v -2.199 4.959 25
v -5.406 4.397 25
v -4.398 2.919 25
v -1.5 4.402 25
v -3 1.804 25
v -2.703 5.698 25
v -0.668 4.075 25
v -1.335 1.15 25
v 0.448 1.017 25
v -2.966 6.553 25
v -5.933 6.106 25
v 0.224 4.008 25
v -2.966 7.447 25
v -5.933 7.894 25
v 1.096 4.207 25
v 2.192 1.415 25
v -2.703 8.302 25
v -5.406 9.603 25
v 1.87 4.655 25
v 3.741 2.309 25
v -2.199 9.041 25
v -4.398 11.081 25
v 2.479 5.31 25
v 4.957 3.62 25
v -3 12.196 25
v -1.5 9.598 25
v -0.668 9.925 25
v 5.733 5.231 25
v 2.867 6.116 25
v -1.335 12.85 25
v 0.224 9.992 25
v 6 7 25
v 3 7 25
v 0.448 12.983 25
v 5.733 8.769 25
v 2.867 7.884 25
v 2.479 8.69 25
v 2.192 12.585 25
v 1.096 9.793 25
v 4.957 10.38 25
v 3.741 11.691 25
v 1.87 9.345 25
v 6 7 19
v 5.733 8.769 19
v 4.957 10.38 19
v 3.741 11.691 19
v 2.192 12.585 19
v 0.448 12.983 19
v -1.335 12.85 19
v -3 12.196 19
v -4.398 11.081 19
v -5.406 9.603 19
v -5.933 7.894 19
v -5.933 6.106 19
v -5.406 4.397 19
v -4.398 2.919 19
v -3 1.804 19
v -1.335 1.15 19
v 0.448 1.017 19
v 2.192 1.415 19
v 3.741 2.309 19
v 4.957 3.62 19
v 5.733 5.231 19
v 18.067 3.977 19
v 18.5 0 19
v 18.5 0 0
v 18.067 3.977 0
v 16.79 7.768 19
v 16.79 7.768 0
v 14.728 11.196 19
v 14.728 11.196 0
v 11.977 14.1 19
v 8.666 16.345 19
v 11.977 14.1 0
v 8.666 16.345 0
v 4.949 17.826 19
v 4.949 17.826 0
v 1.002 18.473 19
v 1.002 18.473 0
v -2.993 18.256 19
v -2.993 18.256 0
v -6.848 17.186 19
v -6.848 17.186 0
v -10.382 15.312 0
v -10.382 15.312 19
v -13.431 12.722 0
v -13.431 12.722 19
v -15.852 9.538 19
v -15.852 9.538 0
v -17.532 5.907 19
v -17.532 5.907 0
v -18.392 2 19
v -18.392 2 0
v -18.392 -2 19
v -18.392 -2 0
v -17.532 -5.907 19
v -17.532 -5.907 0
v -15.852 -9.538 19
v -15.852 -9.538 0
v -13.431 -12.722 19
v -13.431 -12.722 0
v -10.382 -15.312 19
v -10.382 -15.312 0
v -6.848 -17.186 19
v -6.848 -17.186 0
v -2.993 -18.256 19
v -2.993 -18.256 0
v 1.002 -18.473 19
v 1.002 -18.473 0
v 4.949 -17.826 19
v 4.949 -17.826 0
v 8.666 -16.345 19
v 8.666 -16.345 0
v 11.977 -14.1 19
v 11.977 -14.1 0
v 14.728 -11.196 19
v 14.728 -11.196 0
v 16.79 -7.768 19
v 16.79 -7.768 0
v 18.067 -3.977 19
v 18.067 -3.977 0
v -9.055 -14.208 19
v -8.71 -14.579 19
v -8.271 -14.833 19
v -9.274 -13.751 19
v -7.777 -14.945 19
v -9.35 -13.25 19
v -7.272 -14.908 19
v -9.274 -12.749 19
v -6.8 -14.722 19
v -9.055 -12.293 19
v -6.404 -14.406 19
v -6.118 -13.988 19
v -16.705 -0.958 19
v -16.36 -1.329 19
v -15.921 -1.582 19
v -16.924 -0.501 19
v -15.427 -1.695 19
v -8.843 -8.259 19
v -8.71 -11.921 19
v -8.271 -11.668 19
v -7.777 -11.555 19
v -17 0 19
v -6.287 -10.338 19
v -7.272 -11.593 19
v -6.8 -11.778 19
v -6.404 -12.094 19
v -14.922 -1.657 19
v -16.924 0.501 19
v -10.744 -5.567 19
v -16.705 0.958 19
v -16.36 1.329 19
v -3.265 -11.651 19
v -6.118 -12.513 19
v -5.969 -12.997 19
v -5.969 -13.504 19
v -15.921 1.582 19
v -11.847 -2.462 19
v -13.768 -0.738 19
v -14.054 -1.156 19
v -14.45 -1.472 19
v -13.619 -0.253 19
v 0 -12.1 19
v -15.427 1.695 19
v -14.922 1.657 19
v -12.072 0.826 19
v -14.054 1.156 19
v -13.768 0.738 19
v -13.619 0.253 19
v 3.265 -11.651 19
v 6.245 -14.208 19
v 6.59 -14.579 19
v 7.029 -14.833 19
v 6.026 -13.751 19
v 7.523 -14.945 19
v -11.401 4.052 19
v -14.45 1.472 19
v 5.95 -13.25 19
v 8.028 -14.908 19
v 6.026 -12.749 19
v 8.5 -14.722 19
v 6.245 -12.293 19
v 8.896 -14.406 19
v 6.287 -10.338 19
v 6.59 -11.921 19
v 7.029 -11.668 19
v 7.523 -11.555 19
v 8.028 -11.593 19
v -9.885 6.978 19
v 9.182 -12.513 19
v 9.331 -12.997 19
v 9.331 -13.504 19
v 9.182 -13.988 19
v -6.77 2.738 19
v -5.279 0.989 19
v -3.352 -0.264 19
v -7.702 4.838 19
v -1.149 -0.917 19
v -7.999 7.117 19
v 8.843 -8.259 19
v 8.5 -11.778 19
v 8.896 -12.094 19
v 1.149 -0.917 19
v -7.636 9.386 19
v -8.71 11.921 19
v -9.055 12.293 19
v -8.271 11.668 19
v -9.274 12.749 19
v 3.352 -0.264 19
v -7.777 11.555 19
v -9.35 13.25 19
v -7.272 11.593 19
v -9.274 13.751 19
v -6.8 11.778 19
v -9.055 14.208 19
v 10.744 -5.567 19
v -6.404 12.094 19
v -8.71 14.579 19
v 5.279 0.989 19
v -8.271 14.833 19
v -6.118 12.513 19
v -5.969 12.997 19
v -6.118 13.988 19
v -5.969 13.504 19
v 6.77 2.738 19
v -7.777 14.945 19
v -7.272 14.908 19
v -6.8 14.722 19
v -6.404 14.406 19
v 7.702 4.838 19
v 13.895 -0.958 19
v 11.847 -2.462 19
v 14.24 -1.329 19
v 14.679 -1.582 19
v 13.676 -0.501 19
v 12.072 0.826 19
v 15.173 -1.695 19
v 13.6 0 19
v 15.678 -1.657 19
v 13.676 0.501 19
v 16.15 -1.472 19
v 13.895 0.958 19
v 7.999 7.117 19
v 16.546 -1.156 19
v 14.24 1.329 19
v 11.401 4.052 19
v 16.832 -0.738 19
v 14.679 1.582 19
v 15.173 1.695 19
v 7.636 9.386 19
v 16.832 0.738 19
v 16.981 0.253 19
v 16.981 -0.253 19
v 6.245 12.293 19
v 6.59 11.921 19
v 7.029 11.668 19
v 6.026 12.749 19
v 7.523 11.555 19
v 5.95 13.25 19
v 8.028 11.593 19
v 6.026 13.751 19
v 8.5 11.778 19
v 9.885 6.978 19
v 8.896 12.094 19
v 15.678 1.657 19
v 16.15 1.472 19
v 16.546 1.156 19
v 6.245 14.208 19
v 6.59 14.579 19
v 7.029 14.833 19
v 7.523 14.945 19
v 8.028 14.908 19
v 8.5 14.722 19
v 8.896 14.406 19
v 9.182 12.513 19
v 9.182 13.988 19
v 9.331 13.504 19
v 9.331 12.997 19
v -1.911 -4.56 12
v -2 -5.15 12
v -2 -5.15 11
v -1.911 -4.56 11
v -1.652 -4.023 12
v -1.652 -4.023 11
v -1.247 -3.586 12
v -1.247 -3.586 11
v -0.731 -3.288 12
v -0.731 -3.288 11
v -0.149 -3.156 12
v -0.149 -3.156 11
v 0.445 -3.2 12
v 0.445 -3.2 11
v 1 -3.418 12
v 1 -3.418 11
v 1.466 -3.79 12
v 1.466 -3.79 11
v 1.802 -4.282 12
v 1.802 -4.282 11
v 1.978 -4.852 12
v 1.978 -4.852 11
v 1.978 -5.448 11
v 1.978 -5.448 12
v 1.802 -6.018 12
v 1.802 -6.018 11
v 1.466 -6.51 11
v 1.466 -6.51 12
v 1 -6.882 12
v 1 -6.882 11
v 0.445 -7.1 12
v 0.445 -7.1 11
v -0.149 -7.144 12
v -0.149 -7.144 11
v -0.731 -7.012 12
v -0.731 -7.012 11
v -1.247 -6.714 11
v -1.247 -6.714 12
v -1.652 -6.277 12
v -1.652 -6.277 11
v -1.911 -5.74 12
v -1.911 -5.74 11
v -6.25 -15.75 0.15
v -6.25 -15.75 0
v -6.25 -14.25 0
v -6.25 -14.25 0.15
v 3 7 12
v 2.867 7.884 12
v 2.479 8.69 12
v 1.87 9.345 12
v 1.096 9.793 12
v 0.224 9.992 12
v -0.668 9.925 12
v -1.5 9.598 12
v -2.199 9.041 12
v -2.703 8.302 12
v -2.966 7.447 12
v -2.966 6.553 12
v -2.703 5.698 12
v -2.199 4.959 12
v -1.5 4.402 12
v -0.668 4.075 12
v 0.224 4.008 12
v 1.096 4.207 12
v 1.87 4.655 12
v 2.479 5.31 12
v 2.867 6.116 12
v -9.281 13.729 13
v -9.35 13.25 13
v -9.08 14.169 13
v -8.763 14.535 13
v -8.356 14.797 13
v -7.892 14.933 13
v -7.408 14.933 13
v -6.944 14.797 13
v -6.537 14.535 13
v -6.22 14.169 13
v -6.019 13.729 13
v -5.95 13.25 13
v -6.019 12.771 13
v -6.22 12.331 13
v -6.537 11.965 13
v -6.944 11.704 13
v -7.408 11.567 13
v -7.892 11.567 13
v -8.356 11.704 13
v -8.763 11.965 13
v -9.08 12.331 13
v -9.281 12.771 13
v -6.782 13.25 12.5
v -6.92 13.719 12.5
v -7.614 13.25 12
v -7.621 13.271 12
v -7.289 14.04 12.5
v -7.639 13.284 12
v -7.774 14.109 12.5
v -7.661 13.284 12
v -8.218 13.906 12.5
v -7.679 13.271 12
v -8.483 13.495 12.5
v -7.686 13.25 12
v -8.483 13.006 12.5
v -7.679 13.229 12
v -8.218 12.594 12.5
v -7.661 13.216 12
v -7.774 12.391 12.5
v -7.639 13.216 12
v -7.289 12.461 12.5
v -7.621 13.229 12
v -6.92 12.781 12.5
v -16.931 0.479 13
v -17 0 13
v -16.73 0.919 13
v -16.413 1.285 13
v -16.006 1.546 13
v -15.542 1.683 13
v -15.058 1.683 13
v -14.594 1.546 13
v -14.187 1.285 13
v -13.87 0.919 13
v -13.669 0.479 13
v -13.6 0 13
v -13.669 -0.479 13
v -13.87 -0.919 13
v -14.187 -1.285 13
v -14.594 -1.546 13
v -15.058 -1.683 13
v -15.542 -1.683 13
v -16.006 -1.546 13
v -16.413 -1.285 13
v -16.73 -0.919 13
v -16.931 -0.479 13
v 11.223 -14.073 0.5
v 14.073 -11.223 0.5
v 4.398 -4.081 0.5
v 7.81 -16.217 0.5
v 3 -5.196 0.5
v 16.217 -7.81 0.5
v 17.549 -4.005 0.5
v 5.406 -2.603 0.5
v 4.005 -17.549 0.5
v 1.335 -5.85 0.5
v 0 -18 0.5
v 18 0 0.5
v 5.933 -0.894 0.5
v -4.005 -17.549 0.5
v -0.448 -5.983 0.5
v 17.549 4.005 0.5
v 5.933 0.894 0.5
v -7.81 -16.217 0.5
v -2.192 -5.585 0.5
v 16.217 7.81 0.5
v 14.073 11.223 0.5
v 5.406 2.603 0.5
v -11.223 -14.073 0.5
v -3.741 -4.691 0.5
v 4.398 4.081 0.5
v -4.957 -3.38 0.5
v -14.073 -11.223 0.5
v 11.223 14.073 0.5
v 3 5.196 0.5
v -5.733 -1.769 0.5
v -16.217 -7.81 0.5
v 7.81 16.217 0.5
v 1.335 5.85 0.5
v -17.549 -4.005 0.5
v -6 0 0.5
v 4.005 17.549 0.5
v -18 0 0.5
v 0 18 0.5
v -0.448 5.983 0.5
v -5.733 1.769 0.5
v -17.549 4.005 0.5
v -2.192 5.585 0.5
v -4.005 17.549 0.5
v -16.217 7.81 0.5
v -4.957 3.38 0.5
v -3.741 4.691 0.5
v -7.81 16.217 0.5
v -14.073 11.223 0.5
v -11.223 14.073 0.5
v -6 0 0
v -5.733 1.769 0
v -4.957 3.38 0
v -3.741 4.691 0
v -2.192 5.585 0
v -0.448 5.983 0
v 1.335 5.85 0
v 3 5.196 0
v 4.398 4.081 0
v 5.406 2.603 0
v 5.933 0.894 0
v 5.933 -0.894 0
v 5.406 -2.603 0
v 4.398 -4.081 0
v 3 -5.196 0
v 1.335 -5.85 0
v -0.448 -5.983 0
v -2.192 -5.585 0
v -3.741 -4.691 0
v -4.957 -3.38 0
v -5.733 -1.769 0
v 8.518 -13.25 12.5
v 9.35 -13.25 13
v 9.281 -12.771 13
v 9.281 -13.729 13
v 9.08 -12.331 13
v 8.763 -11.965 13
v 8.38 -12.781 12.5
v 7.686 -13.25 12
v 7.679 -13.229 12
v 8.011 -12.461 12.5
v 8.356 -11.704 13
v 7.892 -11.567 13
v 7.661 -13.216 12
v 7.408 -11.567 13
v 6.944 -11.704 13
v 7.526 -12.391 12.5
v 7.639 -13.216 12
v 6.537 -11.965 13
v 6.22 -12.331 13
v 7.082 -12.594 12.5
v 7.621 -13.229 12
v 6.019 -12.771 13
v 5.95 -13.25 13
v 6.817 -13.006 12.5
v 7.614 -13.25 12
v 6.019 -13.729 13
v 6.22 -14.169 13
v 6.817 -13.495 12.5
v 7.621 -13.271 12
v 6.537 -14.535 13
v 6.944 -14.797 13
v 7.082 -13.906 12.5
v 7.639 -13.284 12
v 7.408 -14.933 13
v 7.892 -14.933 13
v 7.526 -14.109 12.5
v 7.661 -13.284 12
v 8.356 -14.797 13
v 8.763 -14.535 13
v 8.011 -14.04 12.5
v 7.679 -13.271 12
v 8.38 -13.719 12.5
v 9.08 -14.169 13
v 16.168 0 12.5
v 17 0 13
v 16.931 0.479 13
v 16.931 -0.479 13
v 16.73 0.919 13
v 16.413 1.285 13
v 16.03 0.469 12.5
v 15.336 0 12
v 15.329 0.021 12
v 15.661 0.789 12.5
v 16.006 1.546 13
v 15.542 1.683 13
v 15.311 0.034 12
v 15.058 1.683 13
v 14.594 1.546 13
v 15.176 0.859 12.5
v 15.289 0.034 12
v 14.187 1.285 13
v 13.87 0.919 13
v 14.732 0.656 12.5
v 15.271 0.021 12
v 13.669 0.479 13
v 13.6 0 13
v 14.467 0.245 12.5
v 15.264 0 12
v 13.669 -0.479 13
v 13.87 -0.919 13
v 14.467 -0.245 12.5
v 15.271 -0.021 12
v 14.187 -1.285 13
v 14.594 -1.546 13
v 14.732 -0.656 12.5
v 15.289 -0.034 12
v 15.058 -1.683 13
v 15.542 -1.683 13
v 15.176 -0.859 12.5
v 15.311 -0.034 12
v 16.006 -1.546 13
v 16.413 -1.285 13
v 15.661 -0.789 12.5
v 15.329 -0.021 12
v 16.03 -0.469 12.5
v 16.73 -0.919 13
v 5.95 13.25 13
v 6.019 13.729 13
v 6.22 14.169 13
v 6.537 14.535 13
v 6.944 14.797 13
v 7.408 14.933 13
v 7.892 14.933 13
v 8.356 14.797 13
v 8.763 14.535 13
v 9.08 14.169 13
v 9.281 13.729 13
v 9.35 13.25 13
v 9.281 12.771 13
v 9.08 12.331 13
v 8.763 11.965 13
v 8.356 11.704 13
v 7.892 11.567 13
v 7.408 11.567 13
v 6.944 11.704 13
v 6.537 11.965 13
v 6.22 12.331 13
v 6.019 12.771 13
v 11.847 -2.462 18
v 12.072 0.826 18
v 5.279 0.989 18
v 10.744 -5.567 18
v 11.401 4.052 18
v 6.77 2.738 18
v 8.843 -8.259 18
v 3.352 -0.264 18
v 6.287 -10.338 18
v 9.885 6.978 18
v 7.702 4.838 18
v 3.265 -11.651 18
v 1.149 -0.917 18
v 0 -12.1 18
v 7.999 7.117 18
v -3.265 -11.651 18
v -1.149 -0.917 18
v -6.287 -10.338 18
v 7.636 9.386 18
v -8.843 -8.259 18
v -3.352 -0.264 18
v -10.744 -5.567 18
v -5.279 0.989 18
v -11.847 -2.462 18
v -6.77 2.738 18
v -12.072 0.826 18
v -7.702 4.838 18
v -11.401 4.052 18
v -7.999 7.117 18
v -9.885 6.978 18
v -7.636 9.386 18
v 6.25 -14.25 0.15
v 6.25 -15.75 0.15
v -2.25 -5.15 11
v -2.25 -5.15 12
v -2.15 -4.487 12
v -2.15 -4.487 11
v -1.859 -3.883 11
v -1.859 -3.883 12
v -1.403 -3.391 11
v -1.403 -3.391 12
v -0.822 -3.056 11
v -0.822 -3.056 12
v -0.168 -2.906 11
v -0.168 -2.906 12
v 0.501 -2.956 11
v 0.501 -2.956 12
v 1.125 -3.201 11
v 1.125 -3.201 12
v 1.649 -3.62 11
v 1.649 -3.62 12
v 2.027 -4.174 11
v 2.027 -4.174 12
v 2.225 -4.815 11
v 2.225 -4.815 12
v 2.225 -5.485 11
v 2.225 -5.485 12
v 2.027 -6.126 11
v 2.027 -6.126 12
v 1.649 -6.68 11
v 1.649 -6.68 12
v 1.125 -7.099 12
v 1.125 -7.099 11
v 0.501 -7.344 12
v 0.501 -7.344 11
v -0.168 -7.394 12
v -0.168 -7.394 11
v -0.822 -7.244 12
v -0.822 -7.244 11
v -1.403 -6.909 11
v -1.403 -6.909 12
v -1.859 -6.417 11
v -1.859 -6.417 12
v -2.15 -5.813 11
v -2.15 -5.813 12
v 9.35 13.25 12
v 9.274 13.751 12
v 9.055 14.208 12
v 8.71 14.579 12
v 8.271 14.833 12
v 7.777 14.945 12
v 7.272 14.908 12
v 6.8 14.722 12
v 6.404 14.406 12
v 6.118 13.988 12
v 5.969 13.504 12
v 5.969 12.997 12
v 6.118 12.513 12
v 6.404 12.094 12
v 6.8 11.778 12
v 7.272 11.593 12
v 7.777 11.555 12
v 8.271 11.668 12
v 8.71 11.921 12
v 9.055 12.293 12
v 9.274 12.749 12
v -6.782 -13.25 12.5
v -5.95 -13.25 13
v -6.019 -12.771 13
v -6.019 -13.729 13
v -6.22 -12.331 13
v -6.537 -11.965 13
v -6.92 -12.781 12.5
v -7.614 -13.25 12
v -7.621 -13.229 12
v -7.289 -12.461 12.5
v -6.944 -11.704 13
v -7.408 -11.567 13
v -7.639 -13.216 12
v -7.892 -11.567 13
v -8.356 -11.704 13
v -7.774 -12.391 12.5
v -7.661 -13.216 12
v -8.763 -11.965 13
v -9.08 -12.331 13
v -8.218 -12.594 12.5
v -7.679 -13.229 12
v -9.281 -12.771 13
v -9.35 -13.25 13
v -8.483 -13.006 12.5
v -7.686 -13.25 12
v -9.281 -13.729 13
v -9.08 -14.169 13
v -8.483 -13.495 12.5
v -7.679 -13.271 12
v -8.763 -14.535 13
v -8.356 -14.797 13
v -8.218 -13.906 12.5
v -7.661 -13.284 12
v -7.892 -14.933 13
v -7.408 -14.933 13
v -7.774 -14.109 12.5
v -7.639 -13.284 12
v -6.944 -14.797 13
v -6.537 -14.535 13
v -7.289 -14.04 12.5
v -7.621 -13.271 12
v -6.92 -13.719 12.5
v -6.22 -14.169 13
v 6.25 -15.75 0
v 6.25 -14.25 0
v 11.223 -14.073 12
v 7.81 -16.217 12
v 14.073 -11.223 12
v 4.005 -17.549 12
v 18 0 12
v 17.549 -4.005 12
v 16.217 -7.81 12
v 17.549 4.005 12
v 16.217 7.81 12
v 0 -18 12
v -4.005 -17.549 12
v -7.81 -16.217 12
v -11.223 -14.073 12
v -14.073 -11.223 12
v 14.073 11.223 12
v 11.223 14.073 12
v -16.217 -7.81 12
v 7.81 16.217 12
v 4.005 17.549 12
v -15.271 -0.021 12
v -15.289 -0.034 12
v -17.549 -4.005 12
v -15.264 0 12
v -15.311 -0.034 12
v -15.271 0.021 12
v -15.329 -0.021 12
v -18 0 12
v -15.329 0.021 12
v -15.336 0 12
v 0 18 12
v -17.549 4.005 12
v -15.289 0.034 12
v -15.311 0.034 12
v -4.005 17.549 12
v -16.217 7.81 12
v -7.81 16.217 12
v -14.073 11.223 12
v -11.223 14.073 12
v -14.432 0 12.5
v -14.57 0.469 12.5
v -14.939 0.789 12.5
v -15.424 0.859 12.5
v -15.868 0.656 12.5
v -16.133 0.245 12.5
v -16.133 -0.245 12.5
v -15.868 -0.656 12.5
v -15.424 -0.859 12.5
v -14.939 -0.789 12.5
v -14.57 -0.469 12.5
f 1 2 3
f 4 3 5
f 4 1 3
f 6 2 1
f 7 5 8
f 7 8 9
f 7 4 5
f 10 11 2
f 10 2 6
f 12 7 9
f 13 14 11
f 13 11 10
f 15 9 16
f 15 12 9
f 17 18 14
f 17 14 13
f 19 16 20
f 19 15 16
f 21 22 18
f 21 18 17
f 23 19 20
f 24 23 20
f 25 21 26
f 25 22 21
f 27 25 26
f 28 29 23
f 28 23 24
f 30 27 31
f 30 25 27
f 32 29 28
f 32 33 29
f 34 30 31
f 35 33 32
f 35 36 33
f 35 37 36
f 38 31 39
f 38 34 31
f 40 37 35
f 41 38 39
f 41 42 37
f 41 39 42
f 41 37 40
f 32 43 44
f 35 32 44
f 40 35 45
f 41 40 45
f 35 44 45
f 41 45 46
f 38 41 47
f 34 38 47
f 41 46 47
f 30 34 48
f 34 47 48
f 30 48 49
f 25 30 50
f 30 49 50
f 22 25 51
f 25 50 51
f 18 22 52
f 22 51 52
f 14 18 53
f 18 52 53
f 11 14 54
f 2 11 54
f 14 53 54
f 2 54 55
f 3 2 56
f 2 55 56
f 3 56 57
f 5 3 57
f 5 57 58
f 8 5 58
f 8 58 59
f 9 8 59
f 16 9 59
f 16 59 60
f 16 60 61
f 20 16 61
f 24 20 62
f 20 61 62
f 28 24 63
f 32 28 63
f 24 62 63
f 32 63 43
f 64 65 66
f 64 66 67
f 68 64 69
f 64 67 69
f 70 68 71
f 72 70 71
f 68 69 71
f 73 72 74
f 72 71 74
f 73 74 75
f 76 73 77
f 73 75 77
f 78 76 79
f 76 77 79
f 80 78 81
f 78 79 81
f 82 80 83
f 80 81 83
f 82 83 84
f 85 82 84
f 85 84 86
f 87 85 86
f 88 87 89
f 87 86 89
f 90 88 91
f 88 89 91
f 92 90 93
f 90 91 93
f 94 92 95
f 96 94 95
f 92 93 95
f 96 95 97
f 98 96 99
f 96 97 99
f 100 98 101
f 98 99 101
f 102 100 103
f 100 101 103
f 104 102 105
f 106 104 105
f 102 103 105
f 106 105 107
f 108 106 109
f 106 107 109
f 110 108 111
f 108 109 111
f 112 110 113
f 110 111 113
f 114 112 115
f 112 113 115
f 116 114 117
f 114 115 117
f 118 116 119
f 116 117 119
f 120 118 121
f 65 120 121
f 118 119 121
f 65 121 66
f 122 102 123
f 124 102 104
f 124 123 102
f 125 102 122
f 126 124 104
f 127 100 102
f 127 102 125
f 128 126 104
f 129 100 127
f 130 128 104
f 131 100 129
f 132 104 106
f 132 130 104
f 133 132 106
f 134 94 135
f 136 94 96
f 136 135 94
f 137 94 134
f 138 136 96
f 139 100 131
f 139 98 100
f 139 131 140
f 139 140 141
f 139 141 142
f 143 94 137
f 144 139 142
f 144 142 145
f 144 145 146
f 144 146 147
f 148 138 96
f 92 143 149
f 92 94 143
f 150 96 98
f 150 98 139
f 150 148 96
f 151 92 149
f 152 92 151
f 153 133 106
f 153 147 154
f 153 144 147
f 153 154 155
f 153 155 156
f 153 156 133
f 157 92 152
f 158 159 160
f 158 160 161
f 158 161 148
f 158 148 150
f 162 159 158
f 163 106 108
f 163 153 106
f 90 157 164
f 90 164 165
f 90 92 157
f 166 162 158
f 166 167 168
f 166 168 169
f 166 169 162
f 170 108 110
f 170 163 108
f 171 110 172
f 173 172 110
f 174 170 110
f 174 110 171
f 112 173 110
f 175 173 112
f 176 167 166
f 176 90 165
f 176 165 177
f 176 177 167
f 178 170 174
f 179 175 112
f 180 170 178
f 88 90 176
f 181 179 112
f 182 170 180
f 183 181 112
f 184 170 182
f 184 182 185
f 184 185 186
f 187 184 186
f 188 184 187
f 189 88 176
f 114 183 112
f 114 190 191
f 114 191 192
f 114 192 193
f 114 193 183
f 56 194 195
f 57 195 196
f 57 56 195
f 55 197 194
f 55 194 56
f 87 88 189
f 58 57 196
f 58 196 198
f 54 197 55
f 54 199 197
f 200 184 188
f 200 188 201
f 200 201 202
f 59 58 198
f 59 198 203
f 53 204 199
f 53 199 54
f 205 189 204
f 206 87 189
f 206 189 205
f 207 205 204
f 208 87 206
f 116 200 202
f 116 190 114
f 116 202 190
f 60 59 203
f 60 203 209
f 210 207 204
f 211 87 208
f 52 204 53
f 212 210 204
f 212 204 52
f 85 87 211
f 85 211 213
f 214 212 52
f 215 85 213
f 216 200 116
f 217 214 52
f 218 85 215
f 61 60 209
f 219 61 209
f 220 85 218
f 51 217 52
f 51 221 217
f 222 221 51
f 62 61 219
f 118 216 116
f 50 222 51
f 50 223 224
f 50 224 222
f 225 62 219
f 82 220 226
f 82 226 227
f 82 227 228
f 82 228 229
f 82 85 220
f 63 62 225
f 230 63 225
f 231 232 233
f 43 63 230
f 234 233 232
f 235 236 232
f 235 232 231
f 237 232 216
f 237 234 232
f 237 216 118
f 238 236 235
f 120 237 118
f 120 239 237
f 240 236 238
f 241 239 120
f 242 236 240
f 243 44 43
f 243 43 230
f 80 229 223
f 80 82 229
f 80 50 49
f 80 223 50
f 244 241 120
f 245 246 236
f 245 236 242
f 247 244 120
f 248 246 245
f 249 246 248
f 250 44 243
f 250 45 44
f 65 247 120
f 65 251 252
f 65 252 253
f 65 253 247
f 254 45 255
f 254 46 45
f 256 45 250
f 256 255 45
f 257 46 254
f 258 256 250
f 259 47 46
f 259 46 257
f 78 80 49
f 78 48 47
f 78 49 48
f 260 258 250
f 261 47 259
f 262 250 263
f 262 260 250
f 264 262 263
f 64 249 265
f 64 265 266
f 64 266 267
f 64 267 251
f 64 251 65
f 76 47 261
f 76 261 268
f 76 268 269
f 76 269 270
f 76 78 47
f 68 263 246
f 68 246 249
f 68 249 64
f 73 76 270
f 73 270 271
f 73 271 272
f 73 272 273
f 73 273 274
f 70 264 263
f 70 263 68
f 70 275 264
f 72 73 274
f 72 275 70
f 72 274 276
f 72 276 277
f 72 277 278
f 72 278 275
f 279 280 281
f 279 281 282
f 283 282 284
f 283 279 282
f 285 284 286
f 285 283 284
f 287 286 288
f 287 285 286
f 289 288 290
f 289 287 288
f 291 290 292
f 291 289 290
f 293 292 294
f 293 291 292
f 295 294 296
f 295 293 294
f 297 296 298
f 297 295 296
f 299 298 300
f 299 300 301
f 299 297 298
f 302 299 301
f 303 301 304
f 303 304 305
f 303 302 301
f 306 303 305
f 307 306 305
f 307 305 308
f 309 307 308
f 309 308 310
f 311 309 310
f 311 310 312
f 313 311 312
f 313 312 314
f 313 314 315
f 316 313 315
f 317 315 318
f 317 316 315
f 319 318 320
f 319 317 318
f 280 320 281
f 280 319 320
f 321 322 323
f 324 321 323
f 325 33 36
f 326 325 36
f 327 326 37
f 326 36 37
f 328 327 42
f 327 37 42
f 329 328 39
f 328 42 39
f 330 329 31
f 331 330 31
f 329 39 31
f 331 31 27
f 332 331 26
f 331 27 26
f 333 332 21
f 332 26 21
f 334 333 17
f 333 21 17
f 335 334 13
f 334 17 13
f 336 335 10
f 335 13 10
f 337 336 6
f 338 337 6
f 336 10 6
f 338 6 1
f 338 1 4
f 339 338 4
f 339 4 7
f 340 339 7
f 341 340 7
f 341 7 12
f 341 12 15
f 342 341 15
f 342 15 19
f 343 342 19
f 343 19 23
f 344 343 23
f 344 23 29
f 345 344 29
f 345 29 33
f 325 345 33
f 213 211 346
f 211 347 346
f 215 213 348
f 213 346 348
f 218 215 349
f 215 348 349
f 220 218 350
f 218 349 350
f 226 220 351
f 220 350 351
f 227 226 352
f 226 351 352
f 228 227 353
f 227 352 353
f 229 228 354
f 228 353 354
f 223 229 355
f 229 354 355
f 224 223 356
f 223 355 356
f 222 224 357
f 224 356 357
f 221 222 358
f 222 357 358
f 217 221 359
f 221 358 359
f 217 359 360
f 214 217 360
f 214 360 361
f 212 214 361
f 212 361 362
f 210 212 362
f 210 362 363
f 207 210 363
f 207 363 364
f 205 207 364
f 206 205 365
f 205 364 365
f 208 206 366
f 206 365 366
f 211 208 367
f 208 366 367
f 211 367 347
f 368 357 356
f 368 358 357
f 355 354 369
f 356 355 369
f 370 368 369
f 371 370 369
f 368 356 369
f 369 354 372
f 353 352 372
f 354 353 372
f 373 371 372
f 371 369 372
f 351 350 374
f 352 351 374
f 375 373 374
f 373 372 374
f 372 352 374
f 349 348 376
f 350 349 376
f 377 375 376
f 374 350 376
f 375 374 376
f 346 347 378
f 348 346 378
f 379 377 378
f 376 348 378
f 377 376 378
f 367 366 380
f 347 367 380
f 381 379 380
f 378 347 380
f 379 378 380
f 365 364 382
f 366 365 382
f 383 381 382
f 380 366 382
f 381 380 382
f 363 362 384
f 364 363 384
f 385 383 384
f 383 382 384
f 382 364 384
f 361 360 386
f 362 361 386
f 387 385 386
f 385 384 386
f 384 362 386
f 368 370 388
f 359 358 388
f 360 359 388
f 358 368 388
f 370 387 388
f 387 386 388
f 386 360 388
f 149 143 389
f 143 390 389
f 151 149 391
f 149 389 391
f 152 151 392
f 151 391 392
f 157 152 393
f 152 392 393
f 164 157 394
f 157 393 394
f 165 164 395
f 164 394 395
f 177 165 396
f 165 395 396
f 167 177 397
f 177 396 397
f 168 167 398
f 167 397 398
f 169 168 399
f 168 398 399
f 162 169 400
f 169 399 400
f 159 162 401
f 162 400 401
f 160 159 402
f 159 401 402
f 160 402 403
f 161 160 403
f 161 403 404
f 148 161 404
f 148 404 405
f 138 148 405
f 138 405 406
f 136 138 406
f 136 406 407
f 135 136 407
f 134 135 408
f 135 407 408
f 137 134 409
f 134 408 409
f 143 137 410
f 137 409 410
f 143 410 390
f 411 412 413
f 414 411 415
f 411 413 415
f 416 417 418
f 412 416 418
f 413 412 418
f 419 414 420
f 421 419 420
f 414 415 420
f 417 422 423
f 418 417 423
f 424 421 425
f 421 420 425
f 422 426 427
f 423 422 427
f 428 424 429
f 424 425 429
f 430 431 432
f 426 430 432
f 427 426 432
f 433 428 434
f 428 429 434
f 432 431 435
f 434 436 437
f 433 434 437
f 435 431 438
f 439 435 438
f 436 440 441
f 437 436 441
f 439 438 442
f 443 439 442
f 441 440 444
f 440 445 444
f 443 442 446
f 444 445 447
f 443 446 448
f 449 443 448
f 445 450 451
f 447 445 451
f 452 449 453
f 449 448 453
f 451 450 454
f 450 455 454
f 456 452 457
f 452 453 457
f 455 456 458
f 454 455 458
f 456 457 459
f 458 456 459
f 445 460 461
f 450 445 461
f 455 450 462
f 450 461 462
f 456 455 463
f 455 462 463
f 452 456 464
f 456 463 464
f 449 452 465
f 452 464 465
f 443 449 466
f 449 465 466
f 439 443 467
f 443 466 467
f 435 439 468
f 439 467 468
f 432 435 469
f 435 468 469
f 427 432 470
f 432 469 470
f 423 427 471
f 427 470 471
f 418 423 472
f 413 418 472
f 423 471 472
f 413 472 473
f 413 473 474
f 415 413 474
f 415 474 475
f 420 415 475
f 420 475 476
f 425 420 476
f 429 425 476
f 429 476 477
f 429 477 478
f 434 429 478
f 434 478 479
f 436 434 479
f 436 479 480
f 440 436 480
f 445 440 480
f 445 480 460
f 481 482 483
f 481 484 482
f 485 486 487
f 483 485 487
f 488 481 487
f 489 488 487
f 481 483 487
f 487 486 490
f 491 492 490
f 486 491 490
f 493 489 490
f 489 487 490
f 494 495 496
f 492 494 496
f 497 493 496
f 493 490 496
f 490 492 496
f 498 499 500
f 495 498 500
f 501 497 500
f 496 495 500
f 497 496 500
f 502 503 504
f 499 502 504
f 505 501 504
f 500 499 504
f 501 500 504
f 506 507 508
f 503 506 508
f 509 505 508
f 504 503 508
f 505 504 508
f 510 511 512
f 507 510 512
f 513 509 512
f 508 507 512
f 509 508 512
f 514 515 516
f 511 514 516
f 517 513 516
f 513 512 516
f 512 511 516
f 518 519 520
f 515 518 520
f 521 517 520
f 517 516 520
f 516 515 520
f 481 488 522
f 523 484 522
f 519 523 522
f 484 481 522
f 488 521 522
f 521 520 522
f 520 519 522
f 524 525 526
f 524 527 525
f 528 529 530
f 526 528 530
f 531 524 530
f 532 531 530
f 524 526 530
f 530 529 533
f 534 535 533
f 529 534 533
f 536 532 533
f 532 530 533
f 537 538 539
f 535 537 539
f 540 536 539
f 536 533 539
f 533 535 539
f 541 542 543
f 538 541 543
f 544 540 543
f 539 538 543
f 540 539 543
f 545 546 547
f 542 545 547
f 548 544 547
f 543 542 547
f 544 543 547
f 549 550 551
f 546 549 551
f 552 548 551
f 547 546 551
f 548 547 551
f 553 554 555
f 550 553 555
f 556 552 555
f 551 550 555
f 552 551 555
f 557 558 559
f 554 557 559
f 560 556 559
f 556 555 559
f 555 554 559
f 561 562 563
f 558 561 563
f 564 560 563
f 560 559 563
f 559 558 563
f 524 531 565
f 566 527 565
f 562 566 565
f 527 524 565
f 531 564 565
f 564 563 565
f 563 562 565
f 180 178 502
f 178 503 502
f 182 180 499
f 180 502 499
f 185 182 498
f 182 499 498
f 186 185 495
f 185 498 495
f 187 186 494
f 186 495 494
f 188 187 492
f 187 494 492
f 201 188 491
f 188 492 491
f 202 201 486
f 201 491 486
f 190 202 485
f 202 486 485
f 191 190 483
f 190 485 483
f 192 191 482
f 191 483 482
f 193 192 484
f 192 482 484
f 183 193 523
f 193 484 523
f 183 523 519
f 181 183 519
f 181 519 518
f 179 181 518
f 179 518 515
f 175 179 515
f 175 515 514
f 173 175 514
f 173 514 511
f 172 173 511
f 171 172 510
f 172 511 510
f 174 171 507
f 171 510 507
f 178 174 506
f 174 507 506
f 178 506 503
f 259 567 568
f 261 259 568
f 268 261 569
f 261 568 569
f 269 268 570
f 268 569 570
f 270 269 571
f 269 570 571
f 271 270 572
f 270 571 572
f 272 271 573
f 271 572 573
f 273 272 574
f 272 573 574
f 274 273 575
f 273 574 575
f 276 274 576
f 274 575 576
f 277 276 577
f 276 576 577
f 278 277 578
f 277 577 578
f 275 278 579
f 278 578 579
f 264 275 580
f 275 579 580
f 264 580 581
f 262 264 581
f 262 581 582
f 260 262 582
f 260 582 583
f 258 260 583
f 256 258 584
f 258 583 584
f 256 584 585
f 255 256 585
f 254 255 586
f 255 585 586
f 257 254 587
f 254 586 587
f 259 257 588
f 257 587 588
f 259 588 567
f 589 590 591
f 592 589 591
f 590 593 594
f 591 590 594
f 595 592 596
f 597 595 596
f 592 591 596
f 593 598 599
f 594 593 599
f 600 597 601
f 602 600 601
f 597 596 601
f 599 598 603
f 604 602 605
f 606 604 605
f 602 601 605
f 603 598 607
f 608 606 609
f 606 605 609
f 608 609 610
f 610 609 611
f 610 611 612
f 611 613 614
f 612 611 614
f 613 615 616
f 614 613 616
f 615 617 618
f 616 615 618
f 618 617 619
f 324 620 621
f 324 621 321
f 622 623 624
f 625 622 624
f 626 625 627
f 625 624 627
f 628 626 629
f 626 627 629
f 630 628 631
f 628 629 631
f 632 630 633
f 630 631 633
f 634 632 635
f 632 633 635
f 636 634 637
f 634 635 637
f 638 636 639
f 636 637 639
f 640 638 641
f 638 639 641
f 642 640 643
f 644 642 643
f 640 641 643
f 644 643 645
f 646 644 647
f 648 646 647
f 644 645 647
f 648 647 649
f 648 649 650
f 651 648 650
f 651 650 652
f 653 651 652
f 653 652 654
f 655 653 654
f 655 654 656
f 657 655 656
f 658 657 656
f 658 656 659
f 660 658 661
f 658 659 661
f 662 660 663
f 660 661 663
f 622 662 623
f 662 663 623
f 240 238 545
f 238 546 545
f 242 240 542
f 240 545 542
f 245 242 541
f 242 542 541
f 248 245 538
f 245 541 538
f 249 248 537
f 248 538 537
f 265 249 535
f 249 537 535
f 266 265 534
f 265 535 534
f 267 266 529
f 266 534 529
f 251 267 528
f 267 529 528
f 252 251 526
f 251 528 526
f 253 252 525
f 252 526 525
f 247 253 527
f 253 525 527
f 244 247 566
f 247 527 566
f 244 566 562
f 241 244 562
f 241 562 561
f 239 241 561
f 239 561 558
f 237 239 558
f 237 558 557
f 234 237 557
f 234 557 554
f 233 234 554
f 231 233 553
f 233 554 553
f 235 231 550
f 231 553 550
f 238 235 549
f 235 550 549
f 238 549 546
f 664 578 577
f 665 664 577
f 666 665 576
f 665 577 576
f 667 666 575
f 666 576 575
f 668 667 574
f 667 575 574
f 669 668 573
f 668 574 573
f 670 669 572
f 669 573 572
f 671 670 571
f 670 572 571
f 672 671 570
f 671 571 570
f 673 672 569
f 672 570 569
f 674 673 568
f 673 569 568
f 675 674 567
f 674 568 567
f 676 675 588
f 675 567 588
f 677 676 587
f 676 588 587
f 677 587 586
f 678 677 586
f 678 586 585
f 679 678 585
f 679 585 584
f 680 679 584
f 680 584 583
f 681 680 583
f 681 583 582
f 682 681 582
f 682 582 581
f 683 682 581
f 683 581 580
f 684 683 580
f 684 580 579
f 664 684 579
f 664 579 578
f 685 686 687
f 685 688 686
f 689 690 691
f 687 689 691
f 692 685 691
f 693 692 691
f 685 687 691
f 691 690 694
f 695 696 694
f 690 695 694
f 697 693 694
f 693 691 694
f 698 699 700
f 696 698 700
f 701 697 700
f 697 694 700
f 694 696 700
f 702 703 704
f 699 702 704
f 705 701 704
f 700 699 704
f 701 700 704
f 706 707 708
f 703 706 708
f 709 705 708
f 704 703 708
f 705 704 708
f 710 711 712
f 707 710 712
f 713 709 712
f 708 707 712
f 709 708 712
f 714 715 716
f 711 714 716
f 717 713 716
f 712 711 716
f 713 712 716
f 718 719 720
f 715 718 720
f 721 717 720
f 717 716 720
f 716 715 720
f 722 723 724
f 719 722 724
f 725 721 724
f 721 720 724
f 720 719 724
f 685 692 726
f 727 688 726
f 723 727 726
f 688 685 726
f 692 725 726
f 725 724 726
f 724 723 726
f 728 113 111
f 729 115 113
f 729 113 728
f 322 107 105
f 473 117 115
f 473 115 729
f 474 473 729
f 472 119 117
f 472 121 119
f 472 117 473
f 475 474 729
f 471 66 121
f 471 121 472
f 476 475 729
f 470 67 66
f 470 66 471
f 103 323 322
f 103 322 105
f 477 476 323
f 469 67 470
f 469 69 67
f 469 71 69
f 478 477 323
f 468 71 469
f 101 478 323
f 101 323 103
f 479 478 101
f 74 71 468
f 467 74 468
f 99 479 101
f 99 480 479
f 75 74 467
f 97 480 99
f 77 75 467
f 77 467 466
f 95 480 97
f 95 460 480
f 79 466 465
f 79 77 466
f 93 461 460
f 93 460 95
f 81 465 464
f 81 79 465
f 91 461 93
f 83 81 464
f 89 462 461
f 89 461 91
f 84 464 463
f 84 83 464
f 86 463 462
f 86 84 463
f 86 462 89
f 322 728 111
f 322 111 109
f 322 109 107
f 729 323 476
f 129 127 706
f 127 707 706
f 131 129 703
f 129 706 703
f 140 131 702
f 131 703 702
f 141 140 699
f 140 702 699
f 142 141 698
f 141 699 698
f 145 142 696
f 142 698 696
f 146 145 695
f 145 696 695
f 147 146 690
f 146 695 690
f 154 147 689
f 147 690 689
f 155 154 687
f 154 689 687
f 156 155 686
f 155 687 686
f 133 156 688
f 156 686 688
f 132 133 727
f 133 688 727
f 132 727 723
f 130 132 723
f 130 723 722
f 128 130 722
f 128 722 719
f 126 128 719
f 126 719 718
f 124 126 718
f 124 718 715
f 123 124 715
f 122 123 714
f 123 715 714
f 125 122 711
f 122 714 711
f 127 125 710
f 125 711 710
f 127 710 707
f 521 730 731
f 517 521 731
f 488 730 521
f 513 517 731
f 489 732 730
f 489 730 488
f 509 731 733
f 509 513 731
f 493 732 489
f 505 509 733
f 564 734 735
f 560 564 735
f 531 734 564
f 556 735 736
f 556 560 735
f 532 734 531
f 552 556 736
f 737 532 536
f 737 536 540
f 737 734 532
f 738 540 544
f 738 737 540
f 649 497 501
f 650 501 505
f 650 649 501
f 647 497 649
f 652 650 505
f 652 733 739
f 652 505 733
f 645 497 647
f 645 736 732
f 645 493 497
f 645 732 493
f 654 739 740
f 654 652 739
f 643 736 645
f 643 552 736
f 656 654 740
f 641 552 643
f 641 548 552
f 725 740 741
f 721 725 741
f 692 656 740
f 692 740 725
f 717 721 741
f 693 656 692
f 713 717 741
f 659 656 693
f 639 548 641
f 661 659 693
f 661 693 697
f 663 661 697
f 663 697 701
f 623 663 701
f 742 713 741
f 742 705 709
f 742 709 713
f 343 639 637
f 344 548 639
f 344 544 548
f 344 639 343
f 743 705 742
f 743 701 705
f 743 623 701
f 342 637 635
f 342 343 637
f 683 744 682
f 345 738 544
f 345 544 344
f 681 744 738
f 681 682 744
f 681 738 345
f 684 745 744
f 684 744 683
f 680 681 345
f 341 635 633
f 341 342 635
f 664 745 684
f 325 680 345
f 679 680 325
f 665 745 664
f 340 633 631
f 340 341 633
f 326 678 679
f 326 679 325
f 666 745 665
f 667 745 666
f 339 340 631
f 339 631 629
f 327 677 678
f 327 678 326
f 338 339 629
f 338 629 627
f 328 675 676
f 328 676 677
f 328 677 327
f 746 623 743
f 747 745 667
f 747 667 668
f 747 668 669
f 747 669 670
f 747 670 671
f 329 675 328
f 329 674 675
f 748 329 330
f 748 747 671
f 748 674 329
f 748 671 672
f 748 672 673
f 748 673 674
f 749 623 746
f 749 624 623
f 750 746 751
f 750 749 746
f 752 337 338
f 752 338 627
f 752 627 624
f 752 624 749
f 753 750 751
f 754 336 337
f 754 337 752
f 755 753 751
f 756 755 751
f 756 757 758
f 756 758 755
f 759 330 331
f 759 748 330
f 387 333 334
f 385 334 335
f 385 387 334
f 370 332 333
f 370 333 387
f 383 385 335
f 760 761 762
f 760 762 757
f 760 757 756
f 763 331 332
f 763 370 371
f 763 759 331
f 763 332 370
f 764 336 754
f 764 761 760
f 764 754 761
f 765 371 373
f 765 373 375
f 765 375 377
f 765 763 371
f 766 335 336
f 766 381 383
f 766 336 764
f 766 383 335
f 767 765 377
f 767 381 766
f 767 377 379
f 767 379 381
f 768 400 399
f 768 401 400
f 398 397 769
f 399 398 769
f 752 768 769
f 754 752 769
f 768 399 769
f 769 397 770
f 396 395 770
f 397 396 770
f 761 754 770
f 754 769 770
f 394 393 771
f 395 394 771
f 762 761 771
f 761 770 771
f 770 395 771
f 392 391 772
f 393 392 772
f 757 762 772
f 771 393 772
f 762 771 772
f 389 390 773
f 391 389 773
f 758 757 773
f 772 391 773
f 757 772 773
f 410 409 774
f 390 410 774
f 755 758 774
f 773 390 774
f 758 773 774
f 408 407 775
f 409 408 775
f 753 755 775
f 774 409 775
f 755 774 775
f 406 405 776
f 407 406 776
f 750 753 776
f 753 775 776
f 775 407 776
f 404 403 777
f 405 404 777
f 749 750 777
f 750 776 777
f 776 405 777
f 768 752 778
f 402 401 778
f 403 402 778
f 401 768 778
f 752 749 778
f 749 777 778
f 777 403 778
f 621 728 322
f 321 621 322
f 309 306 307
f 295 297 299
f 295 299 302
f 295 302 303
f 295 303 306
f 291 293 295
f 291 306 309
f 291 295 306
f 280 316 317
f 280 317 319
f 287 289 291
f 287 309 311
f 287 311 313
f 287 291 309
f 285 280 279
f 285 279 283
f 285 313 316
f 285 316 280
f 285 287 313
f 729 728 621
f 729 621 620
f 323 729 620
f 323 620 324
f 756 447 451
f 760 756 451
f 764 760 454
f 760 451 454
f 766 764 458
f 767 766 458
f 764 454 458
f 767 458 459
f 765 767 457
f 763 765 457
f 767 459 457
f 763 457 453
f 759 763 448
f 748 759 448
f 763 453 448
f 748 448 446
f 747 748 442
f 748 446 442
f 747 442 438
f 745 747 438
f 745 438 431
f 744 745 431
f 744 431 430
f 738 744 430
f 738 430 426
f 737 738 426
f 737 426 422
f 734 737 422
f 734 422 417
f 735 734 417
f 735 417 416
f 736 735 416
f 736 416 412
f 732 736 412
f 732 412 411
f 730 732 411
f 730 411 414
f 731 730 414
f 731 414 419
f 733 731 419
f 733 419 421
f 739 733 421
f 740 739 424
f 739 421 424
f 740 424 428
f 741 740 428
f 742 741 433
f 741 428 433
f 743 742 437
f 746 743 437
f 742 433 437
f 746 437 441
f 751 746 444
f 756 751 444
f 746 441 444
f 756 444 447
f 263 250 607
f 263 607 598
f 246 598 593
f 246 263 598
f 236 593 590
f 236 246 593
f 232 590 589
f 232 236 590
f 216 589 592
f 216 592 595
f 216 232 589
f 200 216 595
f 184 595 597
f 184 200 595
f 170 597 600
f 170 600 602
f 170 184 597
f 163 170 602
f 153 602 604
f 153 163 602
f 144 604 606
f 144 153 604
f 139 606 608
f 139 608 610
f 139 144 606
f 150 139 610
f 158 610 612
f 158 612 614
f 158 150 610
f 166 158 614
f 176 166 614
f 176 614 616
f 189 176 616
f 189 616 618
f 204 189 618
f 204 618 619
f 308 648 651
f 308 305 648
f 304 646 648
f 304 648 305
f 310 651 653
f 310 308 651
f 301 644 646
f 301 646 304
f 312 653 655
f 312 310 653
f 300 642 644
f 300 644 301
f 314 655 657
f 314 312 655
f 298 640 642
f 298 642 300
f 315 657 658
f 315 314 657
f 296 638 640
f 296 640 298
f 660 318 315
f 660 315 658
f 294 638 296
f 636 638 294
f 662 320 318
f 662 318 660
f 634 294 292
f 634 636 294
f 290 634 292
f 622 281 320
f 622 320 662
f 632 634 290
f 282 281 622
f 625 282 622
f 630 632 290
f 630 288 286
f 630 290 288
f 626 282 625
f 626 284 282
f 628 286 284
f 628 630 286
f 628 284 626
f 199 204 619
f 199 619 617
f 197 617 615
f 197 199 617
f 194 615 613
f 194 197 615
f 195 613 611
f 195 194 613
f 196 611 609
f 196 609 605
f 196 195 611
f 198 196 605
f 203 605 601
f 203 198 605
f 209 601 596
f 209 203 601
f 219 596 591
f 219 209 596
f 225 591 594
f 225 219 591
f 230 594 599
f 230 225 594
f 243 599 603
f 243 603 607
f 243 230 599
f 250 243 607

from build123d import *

# Parameters (mm, degrees)
SKETCH1_R                        = 18.5
BOSS_EXTRUDE1_DEPTH              = 19
SKETCH4_R                        = 6
BOSS_EXTRUDE4_DEPTH              = 6
CUT_EXTRUDE2_DEPTH               = 1
TALADRO_DE_MARGEN_PARA_M31_D     = 3.4
TALADRO_DE_MARGEN_PARA_M31_DEPTH = 6
TALADRO_DE_MARGEN_PARA_M31_TIP   = 1.021463052
CROQUIS1_R                       = 18
CORTAR_EXTRUIR2_DEPTH            = 12
CORTAR_EXTRUIR3_REACH            = 27
CROQUIS2_R                       = 3
CROQUIS2_R_2                     = 1.7
CROQUIS3_R                       = 18
SALIENTE_EXTRUIR1_DEPTH          = 0.5
SKETCH11_R                       = 2
CUT_EXTRUDE3_DEPTH               = 10
SKETCH12_W                       = 12.5
SKETCH12_H                       = 1.5
CUT_EXTRUDE4_DEPTH               = 0.15
SKETCH13_R                       = 6
CUT_EXTRUDE5_DEPTH               = 10
SKETCH14_R                       = 2.25
SKETCH14_R_2                     = 2
BOSS_EXTRUDE5_DEPTH              = 1


with BuildPart() as part:
    # Sketch1 → Boss-Extrude1 (new body)
    with BuildSketch(Plane.XY):
        Circle(SKETCH1_R)
    extrude(amount=BOSS_EXTRUDE1_DEPTH)

    # Sketch4 → Boss-Extrude4 (add)
    with BuildSketch(Plane.XY.offset(19)):
        with Locations((0, 7)):
            Circle(SKETCH4_R)
    extrude(amount=BOSS_EXTRUDE4_DEPTH)

    # Sketch8 → Cut-Extrude2 (cut)
    with BuildSketch(Plane.XY.offset(19)):
        with BuildLine():
            ThreePointArc((7.635768375, 9.386428571), (0, -12.1), (-7.635768375, 9.386428571))
            ThreePointArc((-7.635768375, 9.386428571), (0, -1), (7.635768375, 9.386428571))
        make_face()
    extrude(amount=-CUT_EXTRUDE2_DEPTH, mode=Mode.SUBTRACT)

    # Taladro de margen para M31
    with Locations(Plane.XY.offset(19)):
        with Locations((7.65, -13.250188678), (-7.65, -13.250188678), (-15.3, 0), (-7.65, 13.250188678), (15.3, 0), (7.65, 13.250188678)):
            Hole(TALADRO_DE_MARGEN_PARA_M31_D / 2, depth=TALADRO_DE_MARGEN_PARA_M31_DEPTH)
            with Locations((0, 0, -(TALADRO_DE_MARGEN_PARA_M31_DEPTH + TALADRO_DE_MARGEN_PARA_M31_TIP / 2))):  # 118° drill point
                Cone(0, TALADRO_DE_MARGEN_PARA_M31_D / 2, TALADRO_DE_MARGEN_PARA_M31_TIP, mode=Mode.SUBTRACT)

    # Croquis1 → Cortar-Extruir2 (cut)
    with BuildSketch(Plane(origin=(0, 0, 0), x_dir=(-1, 0, 0), z_dir=(0, 0, -1))):
        Circle(CROQUIS1_R)
    extrude(amount=-CORTAR_EXTRUIR2_DEPTH, mode=Mode.SUBTRACT)

    # Croquis2 → Cortar-Extruir3 (cut, up to next)
    with BuildSketch(Plane.XY.offset(25), mode=Mode.PRIVATE) as cortar_extruir3_sk1:
        with Locations((0, 7)):
            Circle(CROQUIS2_R)
    cortar_extruir3_tool1 = extrude(cortar_extruir3_sk1.sketch, amount=-CORTAR_EXTRUIR3_REACH, mode=Mode.PRIVATE) & part.part
    add(cortar_extruir3_tool1.solids().sort_by_distance((0, 7, 25))[0], mode=Mode.SUBTRACT)
    # Croquis2 → Cortar-Extruir3 (cut, up to next)
    with BuildSketch(Plane.XY.offset(25), mode=Mode.PRIVATE) as cortar_extruir3_sk2:
        with Locations((7.65, 13.250188678)):
            Circle(CROQUIS2_R_2)
    cortar_extruir3_tool2 = extrude(cortar_extruir3_sk2.sketch, amount=-CORTAR_EXTRUIR3_REACH, mode=Mode.PRIVATE) & part.part
    add(cortar_extruir3_tool2.solids().sort_by_distance((7.65, 13.250189, 25))[0], mode=Mode.SUBTRACT)

    # Croquis3 → Saliente-Extruir1 (add)
    with BuildSketch(Plane(origin=(0, 0, 0), x_dir=(-1, 0, 0), z_dir=(0, 0, -1))):
        Circle(CROQUIS3_R)
    extrude(amount=-SALIENTE_EXTRUIR1_DEPTH)

    # Sketch11 → Cut-Extrude3 (cut)
    with BuildSketch(Plane(origin=(0, 0, 0), x_dir=(-1, 0, 0), z_dir=(0, 0, -1))):
        Circle(SKETCH11_R)
    extrude(amount=-CUT_EXTRUDE3_DEPTH, mode=Mode.SUBTRACT)

    # Sketch12 → Cut-Extrude4 (cut)
    with BuildSketch(Plane(origin=(0, 0, 0), x_dir=(-1, 0, 0), z_dir=(0, 0, -1))):
        with Locations((0, -15)):
            Rectangle(SKETCH12_W, SKETCH12_H)
    extrude(amount=-CUT_EXTRUDE4_DEPTH, mode=Mode.SUBTRACT)

    # Sketch13 → Cut-Extrude5 (cut)
    with BuildSketch(Plane(origin=(0, 0, 0), x_dir=(-1, 0, 0), z_dir=(0, 0, -1))):
        Circle(SKETCH13_R)
    extrude(amount=-CUT_EXTRUDE5_DEPTH, mode=Mode.SUBTRACT)

    # Sketch14 → Boss-Extrude5 (add)
    with BuildSketch(Plane(origin=(0, 0, 12), x_dir=(-1, 0, 0), z_dir=(0, 0, -1))):
        with Locations((0, -5.15)):
            Circle(SKETCH14_R)
        with Locations((0, -5.15)):
            Circle(SKETCH14_R_2, mode=Mode.SUBTRACT)
    extrude(amount=BOSS_EXTRUDE5_DEPTH)


solid = part.part
